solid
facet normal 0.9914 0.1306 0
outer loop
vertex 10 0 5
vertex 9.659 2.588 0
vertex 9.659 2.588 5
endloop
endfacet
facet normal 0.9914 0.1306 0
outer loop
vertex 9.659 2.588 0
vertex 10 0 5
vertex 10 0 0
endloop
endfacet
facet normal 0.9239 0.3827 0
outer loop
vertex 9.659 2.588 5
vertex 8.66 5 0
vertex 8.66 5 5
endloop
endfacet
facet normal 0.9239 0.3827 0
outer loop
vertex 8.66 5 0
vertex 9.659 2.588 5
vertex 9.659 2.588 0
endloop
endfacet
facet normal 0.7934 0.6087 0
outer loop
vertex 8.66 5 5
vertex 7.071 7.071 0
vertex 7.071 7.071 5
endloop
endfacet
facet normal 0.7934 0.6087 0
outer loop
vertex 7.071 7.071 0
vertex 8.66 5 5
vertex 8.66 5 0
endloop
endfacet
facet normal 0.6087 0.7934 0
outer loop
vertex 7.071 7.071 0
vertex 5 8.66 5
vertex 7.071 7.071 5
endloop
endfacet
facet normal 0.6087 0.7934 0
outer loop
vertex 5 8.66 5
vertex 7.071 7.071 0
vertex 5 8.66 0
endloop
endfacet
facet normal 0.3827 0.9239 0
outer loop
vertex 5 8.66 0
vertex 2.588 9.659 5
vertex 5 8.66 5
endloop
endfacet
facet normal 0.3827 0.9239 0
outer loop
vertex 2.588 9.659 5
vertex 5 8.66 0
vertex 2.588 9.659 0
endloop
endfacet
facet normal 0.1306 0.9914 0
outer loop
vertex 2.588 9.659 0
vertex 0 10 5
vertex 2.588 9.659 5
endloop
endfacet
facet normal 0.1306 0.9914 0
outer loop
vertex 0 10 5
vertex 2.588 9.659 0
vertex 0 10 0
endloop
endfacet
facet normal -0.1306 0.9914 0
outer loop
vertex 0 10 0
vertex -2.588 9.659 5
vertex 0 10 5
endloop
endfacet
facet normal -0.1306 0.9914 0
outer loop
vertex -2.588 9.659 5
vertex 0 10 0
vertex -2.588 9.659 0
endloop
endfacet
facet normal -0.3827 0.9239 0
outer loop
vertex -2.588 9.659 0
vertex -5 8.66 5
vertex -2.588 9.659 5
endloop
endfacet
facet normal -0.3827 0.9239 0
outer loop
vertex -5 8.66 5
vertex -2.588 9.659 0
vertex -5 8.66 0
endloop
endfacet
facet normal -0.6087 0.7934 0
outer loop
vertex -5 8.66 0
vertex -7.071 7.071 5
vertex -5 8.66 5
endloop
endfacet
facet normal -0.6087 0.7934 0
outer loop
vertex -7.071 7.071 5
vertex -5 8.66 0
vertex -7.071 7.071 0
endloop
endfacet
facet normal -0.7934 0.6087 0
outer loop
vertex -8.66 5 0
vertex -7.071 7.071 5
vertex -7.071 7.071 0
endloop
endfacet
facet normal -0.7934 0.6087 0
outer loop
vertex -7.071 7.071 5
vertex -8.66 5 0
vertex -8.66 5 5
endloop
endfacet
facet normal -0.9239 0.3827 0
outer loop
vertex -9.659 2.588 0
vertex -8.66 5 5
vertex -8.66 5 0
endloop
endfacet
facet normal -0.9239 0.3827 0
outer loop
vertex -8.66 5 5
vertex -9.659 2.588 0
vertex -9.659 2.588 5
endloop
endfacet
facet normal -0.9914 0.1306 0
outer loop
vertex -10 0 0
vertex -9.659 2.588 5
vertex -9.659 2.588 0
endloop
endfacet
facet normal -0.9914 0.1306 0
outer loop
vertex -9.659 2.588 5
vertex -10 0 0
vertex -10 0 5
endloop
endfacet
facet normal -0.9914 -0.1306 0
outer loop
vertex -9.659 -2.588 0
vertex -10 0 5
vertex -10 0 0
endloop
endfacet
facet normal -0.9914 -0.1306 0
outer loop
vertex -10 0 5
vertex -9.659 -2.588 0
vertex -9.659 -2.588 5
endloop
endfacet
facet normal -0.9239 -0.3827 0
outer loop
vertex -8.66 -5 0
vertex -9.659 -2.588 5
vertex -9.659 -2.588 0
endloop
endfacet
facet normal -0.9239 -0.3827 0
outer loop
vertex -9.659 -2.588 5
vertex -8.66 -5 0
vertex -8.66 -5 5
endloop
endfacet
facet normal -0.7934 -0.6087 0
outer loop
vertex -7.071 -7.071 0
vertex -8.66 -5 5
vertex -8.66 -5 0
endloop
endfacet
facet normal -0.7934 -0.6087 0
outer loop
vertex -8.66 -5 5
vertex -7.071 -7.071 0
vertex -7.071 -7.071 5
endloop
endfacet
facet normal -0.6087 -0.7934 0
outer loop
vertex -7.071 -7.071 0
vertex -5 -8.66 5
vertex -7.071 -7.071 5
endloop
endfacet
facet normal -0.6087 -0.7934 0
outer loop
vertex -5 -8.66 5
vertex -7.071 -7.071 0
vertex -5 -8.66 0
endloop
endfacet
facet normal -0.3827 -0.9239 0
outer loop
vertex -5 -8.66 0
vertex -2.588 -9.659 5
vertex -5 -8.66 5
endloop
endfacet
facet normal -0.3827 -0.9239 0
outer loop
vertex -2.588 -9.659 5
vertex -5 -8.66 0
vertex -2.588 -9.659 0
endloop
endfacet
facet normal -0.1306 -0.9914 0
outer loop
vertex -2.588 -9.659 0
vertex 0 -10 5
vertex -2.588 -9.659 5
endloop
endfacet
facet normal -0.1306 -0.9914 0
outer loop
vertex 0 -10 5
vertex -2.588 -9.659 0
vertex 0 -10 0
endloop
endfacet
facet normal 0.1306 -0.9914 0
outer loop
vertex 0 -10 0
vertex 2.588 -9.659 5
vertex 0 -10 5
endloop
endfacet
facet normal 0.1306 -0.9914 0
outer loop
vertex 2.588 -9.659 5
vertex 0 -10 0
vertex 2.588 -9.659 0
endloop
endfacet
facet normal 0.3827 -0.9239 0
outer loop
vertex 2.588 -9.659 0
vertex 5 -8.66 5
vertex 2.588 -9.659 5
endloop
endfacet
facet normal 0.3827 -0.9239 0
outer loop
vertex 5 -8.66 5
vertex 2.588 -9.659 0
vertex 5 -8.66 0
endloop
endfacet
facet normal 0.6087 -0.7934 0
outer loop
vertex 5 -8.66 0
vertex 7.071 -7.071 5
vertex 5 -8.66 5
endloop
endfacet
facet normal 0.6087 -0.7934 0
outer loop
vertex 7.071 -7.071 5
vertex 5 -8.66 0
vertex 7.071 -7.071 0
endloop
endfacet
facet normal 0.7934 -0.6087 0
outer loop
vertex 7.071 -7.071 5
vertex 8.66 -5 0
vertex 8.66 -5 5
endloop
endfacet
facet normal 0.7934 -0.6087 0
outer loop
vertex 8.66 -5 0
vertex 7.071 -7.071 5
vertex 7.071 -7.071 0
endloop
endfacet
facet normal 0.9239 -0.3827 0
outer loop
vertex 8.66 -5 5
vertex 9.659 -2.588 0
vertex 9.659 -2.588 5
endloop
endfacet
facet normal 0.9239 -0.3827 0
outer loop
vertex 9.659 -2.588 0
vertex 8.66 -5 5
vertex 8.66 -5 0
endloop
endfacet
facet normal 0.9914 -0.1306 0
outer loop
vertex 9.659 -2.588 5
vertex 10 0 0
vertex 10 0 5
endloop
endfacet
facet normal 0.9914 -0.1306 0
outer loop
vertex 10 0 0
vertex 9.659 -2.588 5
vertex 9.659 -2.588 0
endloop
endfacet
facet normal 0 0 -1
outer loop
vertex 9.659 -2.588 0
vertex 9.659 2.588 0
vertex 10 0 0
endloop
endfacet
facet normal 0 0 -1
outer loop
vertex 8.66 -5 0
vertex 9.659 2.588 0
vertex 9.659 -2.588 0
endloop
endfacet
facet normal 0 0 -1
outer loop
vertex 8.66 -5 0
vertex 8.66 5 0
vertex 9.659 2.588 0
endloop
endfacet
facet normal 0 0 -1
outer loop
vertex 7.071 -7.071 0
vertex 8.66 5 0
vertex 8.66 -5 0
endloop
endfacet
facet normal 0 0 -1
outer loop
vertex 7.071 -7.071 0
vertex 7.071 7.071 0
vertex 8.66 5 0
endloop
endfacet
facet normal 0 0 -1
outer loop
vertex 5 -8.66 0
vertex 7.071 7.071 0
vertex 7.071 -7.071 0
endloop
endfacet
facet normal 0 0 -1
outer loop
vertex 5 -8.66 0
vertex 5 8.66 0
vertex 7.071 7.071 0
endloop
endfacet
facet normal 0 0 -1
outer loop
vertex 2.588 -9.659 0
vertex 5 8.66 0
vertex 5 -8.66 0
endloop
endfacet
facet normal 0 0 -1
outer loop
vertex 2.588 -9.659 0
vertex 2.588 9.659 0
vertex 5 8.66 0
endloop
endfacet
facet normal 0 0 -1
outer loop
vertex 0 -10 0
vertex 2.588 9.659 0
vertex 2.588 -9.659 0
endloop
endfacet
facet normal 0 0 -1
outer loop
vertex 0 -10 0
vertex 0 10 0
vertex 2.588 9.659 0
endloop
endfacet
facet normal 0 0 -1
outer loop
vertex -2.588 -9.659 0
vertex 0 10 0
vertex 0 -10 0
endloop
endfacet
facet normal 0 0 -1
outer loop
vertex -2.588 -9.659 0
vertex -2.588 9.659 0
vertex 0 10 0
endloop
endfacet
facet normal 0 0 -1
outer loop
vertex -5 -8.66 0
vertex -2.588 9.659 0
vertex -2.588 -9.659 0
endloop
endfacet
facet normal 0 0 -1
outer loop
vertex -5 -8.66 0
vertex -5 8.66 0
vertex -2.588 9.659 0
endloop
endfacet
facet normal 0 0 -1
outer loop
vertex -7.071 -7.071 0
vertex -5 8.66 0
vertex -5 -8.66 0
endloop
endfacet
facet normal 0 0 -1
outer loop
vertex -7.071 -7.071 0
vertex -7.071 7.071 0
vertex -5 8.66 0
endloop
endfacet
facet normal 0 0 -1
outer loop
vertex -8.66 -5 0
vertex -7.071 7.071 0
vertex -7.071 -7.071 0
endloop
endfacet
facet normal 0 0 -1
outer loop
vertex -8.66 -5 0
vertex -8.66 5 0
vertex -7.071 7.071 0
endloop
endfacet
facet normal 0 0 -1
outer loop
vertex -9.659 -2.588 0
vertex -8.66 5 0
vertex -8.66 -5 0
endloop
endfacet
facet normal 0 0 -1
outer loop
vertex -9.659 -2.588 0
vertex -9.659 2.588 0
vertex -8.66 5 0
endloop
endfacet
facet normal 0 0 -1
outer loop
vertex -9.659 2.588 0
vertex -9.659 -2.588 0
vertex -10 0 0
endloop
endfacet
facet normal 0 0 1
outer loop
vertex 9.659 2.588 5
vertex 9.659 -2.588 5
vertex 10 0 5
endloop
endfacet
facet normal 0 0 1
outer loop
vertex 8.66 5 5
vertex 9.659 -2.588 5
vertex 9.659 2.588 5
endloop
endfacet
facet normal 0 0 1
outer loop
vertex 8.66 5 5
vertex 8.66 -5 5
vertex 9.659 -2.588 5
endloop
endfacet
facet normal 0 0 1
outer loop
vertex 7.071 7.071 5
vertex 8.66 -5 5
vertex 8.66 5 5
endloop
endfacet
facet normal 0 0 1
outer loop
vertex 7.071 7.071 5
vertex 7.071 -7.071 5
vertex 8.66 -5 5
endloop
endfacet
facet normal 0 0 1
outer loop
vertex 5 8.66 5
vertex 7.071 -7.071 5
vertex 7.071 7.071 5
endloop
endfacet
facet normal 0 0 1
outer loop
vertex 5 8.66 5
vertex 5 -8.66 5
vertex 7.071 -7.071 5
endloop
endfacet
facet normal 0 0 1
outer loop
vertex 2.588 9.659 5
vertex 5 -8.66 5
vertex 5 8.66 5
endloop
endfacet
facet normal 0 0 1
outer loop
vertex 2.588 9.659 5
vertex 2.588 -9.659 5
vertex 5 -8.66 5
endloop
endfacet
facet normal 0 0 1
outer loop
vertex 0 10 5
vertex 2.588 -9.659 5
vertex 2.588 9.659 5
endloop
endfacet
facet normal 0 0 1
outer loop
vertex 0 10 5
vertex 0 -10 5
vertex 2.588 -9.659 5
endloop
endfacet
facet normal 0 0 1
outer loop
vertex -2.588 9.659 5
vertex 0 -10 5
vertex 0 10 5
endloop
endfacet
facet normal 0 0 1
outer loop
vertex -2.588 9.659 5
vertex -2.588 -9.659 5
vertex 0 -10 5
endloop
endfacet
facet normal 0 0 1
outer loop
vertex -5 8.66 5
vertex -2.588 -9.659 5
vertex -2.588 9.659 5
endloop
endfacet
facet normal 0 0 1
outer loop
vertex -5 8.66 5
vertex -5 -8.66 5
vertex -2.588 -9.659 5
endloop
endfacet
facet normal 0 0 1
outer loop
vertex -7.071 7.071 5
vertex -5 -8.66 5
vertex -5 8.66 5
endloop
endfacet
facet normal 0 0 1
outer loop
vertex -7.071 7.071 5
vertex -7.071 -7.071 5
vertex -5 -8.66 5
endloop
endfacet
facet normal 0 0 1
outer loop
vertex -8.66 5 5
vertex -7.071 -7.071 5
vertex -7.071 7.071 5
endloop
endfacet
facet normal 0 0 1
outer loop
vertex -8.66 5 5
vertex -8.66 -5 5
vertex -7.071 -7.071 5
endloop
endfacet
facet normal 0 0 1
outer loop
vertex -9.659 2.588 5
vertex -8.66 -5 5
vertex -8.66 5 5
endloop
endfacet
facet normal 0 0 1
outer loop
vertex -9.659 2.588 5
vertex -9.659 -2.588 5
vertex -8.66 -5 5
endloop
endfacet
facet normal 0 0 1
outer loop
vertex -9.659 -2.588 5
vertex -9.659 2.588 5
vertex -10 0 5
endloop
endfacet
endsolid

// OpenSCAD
// file: lib.scad
// library module intended for `use <lib.scad>`
module gear_stub(teeth=10, radius=8, height=4) {
    cylinder(h=height, r=radius, $fn=teeth * 2);
}

function tooth_pitch(teeth, radius) = (2 * 3.14159265 * radius) / teeth;
// main file
use <lib.scad>

gear_stub(teeth=12, radius=10, height=5);
echo(tooth_pitch(12, 10));
